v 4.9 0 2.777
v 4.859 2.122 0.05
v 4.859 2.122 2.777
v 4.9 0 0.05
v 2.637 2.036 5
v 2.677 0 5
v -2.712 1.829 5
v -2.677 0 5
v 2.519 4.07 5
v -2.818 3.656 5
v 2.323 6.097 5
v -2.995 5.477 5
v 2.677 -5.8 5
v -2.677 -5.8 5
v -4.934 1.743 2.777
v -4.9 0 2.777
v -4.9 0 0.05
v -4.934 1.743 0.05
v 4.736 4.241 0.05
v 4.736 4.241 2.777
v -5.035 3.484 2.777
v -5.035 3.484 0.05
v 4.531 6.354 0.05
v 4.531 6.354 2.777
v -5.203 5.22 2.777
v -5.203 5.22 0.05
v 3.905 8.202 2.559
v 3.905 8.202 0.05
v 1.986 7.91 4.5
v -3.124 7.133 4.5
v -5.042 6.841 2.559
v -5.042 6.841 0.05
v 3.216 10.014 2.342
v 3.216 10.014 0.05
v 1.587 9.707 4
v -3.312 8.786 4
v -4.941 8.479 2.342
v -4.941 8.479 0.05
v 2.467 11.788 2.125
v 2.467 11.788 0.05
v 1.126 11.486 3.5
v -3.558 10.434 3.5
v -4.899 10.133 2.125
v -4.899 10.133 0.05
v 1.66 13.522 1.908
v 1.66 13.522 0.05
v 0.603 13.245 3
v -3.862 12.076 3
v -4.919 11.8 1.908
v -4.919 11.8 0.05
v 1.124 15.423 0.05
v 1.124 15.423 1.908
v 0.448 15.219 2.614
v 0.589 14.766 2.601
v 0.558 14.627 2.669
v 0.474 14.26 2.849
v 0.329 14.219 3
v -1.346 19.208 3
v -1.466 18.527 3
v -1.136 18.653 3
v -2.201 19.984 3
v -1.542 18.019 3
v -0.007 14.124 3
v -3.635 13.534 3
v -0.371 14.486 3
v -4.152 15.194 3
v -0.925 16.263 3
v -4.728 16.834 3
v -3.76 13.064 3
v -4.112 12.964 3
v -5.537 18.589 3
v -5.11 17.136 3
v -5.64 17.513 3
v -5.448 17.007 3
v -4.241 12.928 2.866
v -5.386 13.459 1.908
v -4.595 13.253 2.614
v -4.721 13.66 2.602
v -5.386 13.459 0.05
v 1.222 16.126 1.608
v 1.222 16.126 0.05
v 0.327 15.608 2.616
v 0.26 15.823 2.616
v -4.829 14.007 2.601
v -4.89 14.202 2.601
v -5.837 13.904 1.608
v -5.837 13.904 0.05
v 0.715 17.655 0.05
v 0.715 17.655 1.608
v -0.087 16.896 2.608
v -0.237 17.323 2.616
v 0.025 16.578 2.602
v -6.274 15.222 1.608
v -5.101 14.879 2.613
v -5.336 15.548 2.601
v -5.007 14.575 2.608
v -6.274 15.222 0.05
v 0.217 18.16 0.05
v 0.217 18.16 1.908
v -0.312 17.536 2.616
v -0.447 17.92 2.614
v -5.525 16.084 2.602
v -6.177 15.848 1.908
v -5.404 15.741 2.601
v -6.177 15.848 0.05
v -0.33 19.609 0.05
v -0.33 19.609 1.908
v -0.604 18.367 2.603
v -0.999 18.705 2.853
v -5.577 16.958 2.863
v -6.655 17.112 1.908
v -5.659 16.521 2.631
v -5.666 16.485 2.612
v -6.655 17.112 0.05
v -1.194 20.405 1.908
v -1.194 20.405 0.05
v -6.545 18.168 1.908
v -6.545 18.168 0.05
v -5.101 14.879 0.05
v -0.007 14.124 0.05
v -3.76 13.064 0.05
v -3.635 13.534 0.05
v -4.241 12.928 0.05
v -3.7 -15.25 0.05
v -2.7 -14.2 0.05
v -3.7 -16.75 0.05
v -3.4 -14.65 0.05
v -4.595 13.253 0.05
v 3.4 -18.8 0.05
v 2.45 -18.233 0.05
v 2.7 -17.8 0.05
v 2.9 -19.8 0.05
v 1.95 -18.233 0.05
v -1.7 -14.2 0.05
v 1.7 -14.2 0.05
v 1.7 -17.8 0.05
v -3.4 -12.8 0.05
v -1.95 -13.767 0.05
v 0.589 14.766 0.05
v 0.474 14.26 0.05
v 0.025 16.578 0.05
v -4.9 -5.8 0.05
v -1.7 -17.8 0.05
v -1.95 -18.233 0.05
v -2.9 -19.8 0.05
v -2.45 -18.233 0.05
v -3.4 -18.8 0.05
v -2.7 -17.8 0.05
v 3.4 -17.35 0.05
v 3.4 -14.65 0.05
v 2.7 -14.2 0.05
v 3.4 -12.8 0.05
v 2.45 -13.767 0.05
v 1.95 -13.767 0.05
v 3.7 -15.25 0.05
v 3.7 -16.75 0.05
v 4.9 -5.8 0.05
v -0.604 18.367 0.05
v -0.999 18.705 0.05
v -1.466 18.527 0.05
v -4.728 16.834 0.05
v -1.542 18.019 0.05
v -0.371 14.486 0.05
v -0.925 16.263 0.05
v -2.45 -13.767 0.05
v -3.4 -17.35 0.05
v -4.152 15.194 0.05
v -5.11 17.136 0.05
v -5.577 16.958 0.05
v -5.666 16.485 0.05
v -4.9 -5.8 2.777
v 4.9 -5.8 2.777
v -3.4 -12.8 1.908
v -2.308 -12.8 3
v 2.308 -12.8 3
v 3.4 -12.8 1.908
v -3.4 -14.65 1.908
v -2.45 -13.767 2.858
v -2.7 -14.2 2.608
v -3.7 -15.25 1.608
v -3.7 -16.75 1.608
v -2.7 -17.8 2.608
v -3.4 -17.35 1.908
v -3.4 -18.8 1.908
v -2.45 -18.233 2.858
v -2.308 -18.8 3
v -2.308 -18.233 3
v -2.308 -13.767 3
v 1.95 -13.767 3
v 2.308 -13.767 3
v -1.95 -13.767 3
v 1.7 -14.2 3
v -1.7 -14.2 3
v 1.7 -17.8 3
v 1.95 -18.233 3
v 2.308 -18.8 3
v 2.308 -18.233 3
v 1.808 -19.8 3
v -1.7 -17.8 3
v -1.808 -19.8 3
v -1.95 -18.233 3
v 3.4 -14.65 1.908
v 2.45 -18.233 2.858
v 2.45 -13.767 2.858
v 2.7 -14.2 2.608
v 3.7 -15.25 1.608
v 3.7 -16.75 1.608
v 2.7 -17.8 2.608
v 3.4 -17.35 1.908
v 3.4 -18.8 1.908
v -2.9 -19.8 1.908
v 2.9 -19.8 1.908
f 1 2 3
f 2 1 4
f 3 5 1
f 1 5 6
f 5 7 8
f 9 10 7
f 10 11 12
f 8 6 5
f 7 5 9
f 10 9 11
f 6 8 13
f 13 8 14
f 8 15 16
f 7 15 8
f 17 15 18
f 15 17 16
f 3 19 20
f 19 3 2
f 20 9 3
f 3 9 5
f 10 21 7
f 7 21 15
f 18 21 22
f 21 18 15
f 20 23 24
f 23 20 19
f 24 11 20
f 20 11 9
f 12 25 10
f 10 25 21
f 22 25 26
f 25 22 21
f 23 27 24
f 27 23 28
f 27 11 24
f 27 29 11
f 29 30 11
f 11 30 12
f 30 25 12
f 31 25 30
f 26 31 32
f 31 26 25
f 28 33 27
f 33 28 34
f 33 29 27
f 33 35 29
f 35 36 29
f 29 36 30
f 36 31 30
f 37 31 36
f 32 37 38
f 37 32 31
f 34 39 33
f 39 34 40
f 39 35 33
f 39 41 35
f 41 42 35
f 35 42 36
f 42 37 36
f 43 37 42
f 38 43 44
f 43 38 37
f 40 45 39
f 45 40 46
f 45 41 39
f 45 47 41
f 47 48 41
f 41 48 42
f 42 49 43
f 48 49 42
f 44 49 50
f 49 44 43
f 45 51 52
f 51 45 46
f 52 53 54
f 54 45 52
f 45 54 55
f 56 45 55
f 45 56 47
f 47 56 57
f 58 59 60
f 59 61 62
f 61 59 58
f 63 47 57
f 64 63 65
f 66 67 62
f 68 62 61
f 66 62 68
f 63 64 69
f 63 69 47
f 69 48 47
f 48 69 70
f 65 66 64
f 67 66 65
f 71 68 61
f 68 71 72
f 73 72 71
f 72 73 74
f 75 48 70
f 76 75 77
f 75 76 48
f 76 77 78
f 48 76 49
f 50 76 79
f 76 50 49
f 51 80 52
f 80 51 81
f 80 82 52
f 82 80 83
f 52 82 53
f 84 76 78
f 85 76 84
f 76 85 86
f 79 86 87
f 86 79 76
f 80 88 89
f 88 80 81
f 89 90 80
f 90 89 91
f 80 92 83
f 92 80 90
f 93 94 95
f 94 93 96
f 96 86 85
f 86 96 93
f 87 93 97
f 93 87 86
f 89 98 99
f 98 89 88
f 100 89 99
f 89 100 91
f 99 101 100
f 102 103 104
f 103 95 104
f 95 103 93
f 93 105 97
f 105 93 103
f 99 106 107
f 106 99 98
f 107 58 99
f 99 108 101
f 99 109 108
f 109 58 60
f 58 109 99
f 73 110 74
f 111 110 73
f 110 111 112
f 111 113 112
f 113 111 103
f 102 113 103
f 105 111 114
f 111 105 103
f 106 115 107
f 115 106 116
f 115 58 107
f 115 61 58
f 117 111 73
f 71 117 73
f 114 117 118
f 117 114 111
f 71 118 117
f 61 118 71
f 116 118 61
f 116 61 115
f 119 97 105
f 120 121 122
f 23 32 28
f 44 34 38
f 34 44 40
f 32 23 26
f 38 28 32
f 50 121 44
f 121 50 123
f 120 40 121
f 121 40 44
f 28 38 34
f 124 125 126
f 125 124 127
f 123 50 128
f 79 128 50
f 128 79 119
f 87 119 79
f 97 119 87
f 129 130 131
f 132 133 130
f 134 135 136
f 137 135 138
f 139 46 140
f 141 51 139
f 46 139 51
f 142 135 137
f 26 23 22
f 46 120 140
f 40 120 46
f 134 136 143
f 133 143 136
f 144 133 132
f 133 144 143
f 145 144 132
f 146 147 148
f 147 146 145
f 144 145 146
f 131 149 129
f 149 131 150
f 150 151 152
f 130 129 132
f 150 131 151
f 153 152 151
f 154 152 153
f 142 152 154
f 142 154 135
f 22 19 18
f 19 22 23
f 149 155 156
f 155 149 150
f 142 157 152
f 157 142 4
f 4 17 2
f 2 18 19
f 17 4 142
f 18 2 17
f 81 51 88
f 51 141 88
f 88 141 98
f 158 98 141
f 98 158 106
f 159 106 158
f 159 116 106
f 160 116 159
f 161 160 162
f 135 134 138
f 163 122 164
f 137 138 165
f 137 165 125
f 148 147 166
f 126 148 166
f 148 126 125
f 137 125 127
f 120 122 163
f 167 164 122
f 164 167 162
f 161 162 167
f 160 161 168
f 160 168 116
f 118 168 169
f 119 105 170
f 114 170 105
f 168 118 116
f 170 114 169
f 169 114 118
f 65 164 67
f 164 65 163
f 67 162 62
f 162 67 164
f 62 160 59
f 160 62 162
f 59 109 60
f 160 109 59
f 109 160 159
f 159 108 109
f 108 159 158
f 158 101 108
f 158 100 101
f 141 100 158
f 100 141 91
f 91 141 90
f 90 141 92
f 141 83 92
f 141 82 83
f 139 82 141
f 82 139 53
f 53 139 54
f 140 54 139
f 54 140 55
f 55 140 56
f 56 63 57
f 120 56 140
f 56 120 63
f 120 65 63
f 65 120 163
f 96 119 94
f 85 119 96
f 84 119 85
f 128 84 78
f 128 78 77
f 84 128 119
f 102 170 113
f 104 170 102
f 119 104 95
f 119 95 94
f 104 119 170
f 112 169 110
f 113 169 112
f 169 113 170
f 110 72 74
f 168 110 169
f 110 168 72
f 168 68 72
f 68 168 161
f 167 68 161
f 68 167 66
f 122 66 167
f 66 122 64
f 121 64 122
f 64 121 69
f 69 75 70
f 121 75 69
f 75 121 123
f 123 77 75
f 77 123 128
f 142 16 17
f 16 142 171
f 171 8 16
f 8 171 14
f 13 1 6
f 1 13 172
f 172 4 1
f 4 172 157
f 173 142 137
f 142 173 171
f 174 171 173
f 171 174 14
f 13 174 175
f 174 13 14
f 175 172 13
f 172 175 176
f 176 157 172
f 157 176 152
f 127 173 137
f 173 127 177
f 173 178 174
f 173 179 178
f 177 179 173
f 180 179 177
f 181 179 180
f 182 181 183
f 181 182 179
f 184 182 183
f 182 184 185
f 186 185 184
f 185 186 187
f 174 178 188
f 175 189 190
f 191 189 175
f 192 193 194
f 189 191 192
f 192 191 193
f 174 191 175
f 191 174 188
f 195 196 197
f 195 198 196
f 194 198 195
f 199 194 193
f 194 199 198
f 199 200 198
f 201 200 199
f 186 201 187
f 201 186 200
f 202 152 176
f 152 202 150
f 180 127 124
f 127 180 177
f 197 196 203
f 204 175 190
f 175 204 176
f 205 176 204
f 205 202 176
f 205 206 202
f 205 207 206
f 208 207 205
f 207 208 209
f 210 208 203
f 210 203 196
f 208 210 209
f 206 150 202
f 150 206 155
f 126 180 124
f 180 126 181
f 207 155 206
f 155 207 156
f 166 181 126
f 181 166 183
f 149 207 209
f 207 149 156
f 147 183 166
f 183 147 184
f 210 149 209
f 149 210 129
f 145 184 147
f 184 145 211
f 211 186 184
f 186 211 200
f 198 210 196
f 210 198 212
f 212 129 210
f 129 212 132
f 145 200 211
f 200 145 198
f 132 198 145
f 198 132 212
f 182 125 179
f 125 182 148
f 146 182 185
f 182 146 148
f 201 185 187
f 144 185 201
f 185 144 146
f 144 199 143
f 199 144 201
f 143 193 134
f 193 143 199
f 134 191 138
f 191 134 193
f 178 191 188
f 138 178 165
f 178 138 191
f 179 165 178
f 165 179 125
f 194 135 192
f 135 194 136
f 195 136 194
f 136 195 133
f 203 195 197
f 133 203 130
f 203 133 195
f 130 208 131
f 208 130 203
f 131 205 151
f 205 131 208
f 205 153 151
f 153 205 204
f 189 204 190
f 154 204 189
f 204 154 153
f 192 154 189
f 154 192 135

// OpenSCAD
X = 0;
Y = 1;
Z = 2;

//TODO reenforcment
mortise_config = mortise_config(r=undef);

%render()difference() {
    translate([-9.5, 0.1, -1])cube([17, 22, 8]);
    Mortise(mortise_config(mortise_config, r=50));
}

render() union() {
    Tenon(mortise_config(mortise_config, r=50));
    mirror([0,1,0])Tenon(mortise_config);
}

function is_def(v) = !is_undef(v);
function config_value(index, config1, config2, value) = (
    (is_def(value)) ? (
        value
    ) : (is_def(config1[index])) ? (
        config1[index]
    ) : (
        config2[index]
    )
);


function mortise_config(
    config1, config2,
    tolerance_lenght, length, width_1, width_2, thickness_1, thickness_2, notch, tight_length, bevel, r,
    tolerance_side, tolerance_bottom, tolerance_top, tolerance_bevel
) = [
    config_value( 0, config1, config2, tolerance_lenght),    
    config_value( 1, config1, config2, length),
    config_value( 2, config1, config2, width_1),
    config_value( 3, config1, config2, width_2),
    config_value( 4, config1, config2, thickness_1),
    config_value( 5, config1, config2, thickness_2),
    config_value( 6, config1, config2, notch),
    config_value( 7, config1, config2, tight_length),
    config_value( 8, config1, config2, bevel),
    config_value( 9, config1, config2, r),
    config_value(10, config1, config2, tolerance_side),
    config_value(11, config1, config2, tolerance_bottom),
    config_value(12, config1, config2, tolerance_top),
    config_value(13, config1, config2, tolerance_bevel)
];
default_mortise_config = mortise_config(
    tolerance_lenght =   0.2,    
    length =            20.0,
    width_1 =           10.0,
    width_2 =            7.0,
    thickness_1 =        6.0,
    thickness_2 =        4.0,
    notch =             [1.5, 0.2],
    tight_length =       6.0,
    bevel =              1.0,
    r =                  undef,
    tolerance_side =     0.1,
    tolerance_bottom =   0.05,
    tolerance_top =      1.0,
    tolerance_bevel =   -0.05
);
echo(mortise_config(default_mortise_config, r = 10));

module Mortise(config = default_mortise_config) {
    MortiseAndTenon("mortise", config);
}
module Tenon(config = default_mortise_config) {
    MortiseAndTenon("tenon", config);
}

module MortiseAndTenon(
    part   = "mortise",
    config = default_mortise_config
) {
    assert(part == "mortise" || part == "tenon", "'part' must be either \"mortise\" or \"tenon\"");

    effective_config = mortise_config(config1 = config, config2 = default_mortise_config);
    function get_config(index, allow_undef=false) = (
        let(v = effective_config[index])
        assert(allow_undef || !is_undef(v), str("config with index ", index, " not defined"))
        v
    );
    z_tolerance  = part == "tenon" ? -get_config(0) : 0;
    length       = get_config(1);
    width_1      = get_config(2);
    width_2      = get_config(3);
    thickness_1  = get_config(4);
    thickness_2  = get_config(5);
    notch        = get_config(6);
    tight_length = get_config(7);
    bevel        = get_config(8);
    r            = get_config(9, allow_undef = true);
    tolerance_side   = get_config(10);
    tolerance_bottom = get_config(11);
    tolerance_top    = get_config(12);
    tolerance_bevel  = get_config(13);
    
    r_error = width_1 / ($preview ? 100 : 1000);
    mortise_offsets = offsets(
        side   = 0,
        bottom = 0,
        top    = 0,
        bevel  = 0 
    );
    tenon_offsets = offsets(
        side   = -tolerance_side,
        bottom = -tolerance_bottom,
        top    = -tolerance_top,
        bevel  = -tolerance_bevel
    );

    points = mortise_points(
        z_tolerance  = z_tolerance,
        length       = length,
        width_1      = width_1,
        width_2      = width_2,
        thickness_1  = thickness_1,
        thickness_2  = thickness_2,
        notch        = [notch[0], notch[1] * ((part == "tenon") ? 1.5 : 1)],
        tight_length = tight_length,
        bevel        = bevel,
        offsets      = part == "mortise" ? mortise_offsets : tenon_offsets,
        r            = r,
        r_error      = r_error
    );
    rotate(180) rotate(90, [1,0,0]) render() difference() {
        polyhedron(points = points, faces = faces(points));
        if(part == "tenon") SlideSlots();
    }
    module SlideSlots() {
        rotate(90, [1,0,0]) {
            linear_extrude(12, center = true) {
                SlideSlot_2d(offset_x =  width_2 / 2 - (1 / 2) - (2 * 0.4));
                SlideSlot_2d(offset_x = -width_2 / 2 + (1 / 2) + (2 * 0.4));
            }
        }
        module SlideSlot_2d(
            offset_x
        ) {
            polygon(slide_slot_points(
                length = tight_length * 3/5,,
                width  = 1,
                r_error = 0.1,
                offset = [
                    length - bevel - tight_length / 2,
                    offset_x
                ],
                r = r
            ));
        }
    }

    //
    function offsets(
        side   = 0.1,
        bottom = 0.05,
        top    = 1.0,
        bevel  = 0.15
    ) = [
        side,
        bottom,
        top,
        bevel 
    ];
    function mortise_points(
        z_tolerance, length, width_1, width_2, thickness_1, thickness_2, notch, tight_length, bevel, offsets, r, r_error
    ) = let(
        fs = (
            is_undef(r) ? undef : (
                assert(
                    !is_undef(r_error),
                    "If 'r' is defined, you must define 'r_error' too"
                ) let(
                    r_max = r + max(width_1, width_2) / 2
                ) size_of_facet(r, r_error)
            )
        ),
        q = length - bevel - tight_length / 2,
        z_width_and_offset_sides = concat(
            [
                [0,                                           width_1,         0,        thickness_1],
                [z_tolerance + tight_length,                  width_1,         0,        thickness_1],
                [z_tolerance + length - bevel - tight_length, width_2,         0,        thickness_2]
            ], is_undef(notch) ? [] : [
                [q - notch[0] / 2 - 2 * notch[1],             width_2,         0,        thickness_2],
                [q - notch[0] / 2,                            width_2,         notch[1], thickness_2],
                [q + notch[0] / 2,                            width_2,         notch[1], thickness_2],
                [q + notch[0] / 2 + 2 * notch[1],             width_2,         0,        thickness_2]
            ], [
                [z_tolerance + length - bevel,                width_2,         0,        thickness_2],
                [z_tolerance + length,                        width_2 - bevel, 0,        thickness_2]
            ]
        )
    ) bend_points_3d(
        r = r,
        points = [
            each for (i = [0 : len(z_width_and_offset_sides) - 2]) (
                section_points_3d(
                    z_from           = z_width_and_offset_sides[i    ][0],
                    z_to             = z_width_and_offset_sides[i + 1][0], 
                    width_from       = z_width_and_offset_sides[i    ][1],
                    width_to         = z_width_and_offset_sides[i + 1][1],
                    offset_side_from = z_width_and_offset_sides[i    ][2],
                    offset_side_to   = z_width_and_offset_sides[i + 1][2],
                    thickness_from   = z_width_and_offset_sides[i    ][3],
                    thickness_to     = z_width_and_offset_sides[i + 1][3],
                    offsets          = offsets,
                    fs = fs,
                    skip_first_ring = (i!=0))
            )
        ]
    );

    // Calculate the 3d points of a section
    function section_points_3d(
        z_from, z_to, width_from, width_to, offset_side_from, offset_side_to, thickness_from, thickness_to, offsets, fs, skip_first_ring
    ) = (let(
            steps = is_undef(fs) ? 1 : ceil(max(1, abs(z_from - z_to) / fs))
        ) [
            each for (step = [(skip_first_ring?1:0):steps]) (
                let(
                    f           = steps > 0 ? step / steps : 0,
                    z           = z_from           * (1 - f) + z_to           * f,
                    width       = width_from       * (1 - f) + width_to       * f,
                    offset_side = offset_side_from * (1 - f) + offset_side_to * f,
                    thickness   = thickness_from   * (1 - f) + thickness_to   * f,
                    ps    = profile_points_2d(
                        width       = width,
                        thickness   = thickness,
                        offset_side = offset_side,
                        offsets     = offsets
                    )
                )
                [for (i = [0:len(ps)-1]) [
                    ps[i][X],
                    ps[i][Y],
                    z
                ]]
            )
        ]
    );

    // Calculate the 2D points of the profile
    function profile_points_2d(width, thickness, offset_side, offsets) = (
        let(
            thickness     = thickness,
            bevel         = min(thickness / 2.5, width / 3),
            bevel_angle   = 45,
            offset_side2  = offsets[0] + offset_side,
            offset_bottom = offsets[1],
            offset_top    = offsets[2],
            offset_bevel  = offsets[3],
            a = width / 2 ,
            b = a - (bevel - offset_bevel) / cos(bevel_angle) - offset_top * tan(bevel_angle),
            c = thickness,
            d = c - (bevel - offset_bevel) / sin(bevel_angle) - offset_side2 / tan(bevel_angle)
        )[
            [ a + offset_side2, 0 - offset_bottom],
            [ a + offset_side2,  d],
            [ b,  c + offset_top],
            [-b,  c + offset_top],
            [-a - offset_side2,  d],
            [-a - offset_side2,  0 - offset_bottom]
        ]
    );
    
    // Calculate the faces for the polygon
    function faces(points) = concat(
        [[0,1,2,3,4,5]],
        [each for (i = [0 : 6 : len(points) - 7])[
            [i + 0, i +  6, i +  7, i + 1],
            [i + 1, i +  7, i +  8, i + 2],
            [i + 2, i +  8, i +  9, i + 3],
            [i + 3, i +  9, i + 10, i + 4],
            [i + 4, i + 10, i + 11, i + 5],
        ]],
        [[for (i = [len(points)-1:-1:len(points)-6]) i]],
        [concat(
            [for (i = [len(points)-6:-6:0]) i],
            [for (i = [5:6:len(points)-1]) i]
        )]
    );
}

// Bending the 3D points
function bend_points_3d(r = undef, points) = (
    is_undef(r) ? (
        points
    ) : [
        for (p = points) [
            r - cos(p[Z] / r * (180 / PI)) * (p[X] + r),
            p[Y],
            sin(p[Z] / r * (180 / PI)) * (p[X] + r)
        ]
    ]
);
function bend_points_2d(r = undef, points) = (
    is_undef(r) ? (
        points
    ) : [
        for (p = points) [
            r - cos(p[Y] / r * (180 / PI)) * (p[X] + r),
            sin(p[Y] / r * (180 / PI)) * (p[X] + r)
        ]
    ]
);

// Calculate points of lines and shapes
function slide_slot_points(
    length,
    width,
    r_error,
    offset = [0, 0], // In rotated field
    r = undef
) = bend_points_2d(
    r = r,
    points = (
        let(
            line_steps = is_undef(r) ? (
                2
            ) : (
                ceil(length / size_of_facet(r = r, r_error = r_error)) + 1
            )
        ) concat(
            arc_points(r = width / 2, a_from = 180, a_to = 360, offset = [offset[Y], -length / 2 + offset[X]], r_error = r_error),
            line_points(from = [width / 2 + offset[Y], -length / 2 + offset[X]], to = [width / 2 + offset[Y], length / 2 + offset[X]], steps = line_steps, skip_first = true, skip_last = true),
            arc_points(r = width / 2, a_from =   0, a_to = 180, offset = [offset[Y],  length / 2 + offset[X]], r_error = r_error),
            line_points(from = [-width / 2 + offset[Y], length / 2 + offset[X]], to = [-width / 2 + offset[Y], -length / 2 + offset[X]], steps = line_steps, skip_first = true, skip_last = true)
        )
    )
);

function arc_points(
    r,
    a_from,
    a_to,
    r_error,
    offset = [0,0],
    skip_first = false,
    skip_last  = false
) = let(
    fn    = number_of_facet(r = r, r_error = r_error),
    steps = ceil(abs(a_to - a_from) / fn)
) [ for(i = [(skip_first?1:0):(steps-(skip_last?1:0))]) (
    let(
        f = i / steps,
        a = a_to * f + a_from * (1 - f)
    ) [
        cos(a) * r + offset[X],
        sin(a) * r + offset[Y]
    ]
)];

function line_points(
    from,
    to,
    steps      = 2,
    skip_first = false,
    skip_last  = false
) = let (
) [ for(i = [(skip_first?1:0):(steps-(skip_last?1:0))]) (
    let(
        f = i / steps
    ) to * f + from * (1 - f)
)];

// Calculate facets of a circle    
function number_of_facet(r, r_error) = 2 * acos(1 - r_error/r);
function size_of_facet(r, r_error) = number_of_facet(r, r_error) * PI * r / 180;
